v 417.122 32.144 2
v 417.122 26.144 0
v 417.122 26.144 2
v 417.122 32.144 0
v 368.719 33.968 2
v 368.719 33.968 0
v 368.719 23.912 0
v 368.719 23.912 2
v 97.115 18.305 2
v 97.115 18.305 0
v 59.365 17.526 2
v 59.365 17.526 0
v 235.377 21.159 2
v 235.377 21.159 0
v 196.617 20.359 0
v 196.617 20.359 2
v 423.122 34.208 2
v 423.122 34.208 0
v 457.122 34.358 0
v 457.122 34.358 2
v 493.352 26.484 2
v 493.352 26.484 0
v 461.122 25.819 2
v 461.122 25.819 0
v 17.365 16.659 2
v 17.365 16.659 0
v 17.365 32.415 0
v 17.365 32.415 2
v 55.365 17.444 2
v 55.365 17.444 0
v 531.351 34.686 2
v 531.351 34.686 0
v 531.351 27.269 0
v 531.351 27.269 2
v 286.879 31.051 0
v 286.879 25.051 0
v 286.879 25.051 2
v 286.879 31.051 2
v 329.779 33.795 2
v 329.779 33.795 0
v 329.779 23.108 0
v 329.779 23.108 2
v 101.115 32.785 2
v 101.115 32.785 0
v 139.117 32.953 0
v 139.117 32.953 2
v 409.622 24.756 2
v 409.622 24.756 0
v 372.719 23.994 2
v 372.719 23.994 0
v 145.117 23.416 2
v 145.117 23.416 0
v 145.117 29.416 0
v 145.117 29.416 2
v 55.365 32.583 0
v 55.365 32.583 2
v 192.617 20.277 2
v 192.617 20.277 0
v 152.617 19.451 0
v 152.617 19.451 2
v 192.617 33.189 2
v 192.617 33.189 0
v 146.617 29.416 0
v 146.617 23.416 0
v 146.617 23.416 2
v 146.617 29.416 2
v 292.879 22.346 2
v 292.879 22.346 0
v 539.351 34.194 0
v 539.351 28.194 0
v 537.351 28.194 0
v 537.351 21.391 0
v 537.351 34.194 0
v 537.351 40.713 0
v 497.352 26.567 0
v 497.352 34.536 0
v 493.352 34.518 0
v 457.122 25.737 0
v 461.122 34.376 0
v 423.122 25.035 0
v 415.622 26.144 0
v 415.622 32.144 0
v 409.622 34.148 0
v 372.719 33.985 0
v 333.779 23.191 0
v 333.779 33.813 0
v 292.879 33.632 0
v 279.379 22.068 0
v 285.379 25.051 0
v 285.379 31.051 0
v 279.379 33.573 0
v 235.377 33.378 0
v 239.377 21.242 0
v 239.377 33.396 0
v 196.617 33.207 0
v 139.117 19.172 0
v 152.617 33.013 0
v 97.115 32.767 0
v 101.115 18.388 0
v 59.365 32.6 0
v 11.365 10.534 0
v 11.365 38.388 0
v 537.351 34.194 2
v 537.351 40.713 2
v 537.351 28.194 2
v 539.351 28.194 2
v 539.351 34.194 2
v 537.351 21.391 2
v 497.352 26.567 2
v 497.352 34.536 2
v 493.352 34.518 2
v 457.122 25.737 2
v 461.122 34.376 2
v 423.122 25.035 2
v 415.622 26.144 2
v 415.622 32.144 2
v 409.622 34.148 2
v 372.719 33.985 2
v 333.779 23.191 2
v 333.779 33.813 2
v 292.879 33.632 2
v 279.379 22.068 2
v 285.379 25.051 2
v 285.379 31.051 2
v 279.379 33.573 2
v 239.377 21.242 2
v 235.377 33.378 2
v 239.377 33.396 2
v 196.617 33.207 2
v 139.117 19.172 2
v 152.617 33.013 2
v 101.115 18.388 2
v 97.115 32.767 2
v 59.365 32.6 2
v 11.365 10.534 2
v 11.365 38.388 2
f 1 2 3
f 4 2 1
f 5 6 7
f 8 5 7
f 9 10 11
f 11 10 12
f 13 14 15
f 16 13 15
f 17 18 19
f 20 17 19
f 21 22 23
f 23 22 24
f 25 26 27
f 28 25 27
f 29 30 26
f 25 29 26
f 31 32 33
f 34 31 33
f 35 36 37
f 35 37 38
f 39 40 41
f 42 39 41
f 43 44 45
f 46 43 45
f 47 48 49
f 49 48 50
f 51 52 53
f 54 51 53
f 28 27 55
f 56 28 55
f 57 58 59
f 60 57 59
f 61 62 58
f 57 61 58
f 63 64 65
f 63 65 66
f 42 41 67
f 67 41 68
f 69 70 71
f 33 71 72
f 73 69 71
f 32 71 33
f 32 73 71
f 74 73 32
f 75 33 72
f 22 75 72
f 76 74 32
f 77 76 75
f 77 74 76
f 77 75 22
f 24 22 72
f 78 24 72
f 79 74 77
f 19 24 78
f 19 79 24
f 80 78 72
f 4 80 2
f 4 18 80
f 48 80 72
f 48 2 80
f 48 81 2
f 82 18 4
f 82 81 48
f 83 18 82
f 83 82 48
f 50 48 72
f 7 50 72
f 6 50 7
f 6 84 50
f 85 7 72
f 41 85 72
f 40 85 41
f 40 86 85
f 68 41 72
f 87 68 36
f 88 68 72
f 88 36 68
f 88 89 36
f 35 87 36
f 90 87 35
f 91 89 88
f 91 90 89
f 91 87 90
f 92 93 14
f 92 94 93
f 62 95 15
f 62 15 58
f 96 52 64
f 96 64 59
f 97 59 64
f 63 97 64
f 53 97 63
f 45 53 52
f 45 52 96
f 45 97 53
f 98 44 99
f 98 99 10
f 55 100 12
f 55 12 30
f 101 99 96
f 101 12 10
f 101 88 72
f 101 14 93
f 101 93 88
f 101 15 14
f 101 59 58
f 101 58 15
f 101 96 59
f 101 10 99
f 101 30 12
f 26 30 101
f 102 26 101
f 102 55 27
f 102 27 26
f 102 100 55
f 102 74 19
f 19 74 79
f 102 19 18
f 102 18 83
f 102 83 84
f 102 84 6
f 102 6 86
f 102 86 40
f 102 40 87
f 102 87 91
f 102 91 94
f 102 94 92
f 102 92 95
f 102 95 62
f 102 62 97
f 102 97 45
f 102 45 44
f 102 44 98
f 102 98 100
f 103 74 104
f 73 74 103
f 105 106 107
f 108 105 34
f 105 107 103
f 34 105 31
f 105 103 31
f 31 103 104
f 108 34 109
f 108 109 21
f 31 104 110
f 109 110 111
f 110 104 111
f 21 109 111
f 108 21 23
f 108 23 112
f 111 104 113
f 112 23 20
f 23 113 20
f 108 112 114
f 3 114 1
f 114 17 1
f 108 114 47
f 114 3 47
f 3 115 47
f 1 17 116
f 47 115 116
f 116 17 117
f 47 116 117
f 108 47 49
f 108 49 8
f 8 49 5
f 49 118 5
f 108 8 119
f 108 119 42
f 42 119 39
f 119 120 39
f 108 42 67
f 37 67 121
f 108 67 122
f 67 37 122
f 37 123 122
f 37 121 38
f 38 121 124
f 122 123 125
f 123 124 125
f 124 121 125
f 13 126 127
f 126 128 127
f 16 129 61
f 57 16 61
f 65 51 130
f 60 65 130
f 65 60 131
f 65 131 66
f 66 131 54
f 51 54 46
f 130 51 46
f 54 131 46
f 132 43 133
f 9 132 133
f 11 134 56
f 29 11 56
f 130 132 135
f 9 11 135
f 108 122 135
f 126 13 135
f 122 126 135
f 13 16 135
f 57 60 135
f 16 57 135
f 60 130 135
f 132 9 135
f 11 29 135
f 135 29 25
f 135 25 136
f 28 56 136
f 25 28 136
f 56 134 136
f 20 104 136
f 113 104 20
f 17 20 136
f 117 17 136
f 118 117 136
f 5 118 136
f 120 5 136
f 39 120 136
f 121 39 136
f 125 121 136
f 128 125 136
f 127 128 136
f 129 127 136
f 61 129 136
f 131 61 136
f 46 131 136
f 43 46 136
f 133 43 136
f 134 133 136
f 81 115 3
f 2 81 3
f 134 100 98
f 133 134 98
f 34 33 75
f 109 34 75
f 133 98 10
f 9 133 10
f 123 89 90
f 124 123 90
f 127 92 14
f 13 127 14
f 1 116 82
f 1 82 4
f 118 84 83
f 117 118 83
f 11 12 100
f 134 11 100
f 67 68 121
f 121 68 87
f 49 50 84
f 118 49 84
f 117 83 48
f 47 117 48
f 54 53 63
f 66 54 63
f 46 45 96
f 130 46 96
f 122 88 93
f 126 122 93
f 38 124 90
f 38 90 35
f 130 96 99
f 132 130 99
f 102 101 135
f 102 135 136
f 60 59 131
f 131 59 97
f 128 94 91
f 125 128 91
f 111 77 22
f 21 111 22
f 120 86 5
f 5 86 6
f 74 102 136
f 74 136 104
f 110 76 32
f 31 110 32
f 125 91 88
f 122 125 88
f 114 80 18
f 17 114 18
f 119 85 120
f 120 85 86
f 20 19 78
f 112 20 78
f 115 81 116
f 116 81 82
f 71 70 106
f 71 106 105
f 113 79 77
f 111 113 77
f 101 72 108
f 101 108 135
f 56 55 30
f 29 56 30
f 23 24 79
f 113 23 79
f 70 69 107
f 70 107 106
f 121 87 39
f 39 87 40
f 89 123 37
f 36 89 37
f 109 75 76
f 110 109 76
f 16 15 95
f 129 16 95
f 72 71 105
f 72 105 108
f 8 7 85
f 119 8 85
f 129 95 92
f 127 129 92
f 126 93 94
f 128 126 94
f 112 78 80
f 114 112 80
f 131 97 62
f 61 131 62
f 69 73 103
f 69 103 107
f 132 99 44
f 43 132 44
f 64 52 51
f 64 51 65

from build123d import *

# Parameters (mm, degrees)
SKETCH_1_W      = 1.499999968
SKETCH_1_H      = 6.000000011
SKETCH_1_H_2    = 6.00000001
SKETCH_1_W_2    = 1.5
SKETCH_1_H_3    = 6
EXTRUDE_1_DEPTH = 2


with BuildPart() as part:
    # 草图1 → 凸台-拉伸1 (new body)
    with BuildSketch(Plane.XY):
        Polygon((537.351209242, 34.194218327), (539.351209242, 34.194218327), (539.351209242, 28.194218337), (537.351209274, 28.194218337), (537.351209274, 21.391410378), (11.364676515, 10.534074896), (11.364676515, 38.388326082), (537.351216266, 40.712891717), align=None)
        with Locations((416.371863849, 29.143567663)):
            Rectangle(SKETCH_1_W, SKETCH_1_H, mode=Mode.SUBTRACT)
        with Locations((286.128813818, 28.050804453)):
            Rectangle(SKETCH_1_W, SKETCH_1_H_2, mode=Mode.SUBTRACT)
        with Locations((145.867074626, 26.415625273)):
            Rectangle(SKETCH_1_W_2, SKETCH_1_H_3, mode=Mode.SUBTRACT)
        Polygon((531.351209242, 34.686316456), (531.351209242, 27.268837395), (497.351863833, 26.567027983), (497.351863833, 34.536058409), align=None, mode=Mode.SUBTRACT)
        Polygon((493.351863833, 26.48446058), (461.121863833, 25.819173732), (461.121863833, 34.37594212), (493.351863833, 34.518380652), align=None, mode=Mode.SUBTRACT)
        Polygon((457.121863833, 25.736606329), (423.121863833, 25.034783405), (423.121863833, 34.208003423), (457.121863833, 34.358264363), align=None, mode=Mode.SUBTRACT)
        Polygon((409.621863833, 34.148340991), (409.621863833, 24.75611842), (372.718813802, 23.994371171), (372.718813802, 33.985250198), align=None, mode=Mode.SUBTRACT)
        Polygon((368.718813802, 23.911803768), (333.778813802, 23.190577505), (333.778813802, 33.813157228), (368.718813802, 33.967572441), align=None, mode=Mode.SUBTRACT)
        Polygon((329.778813802, 23.108010102), (292.878813802, 22.346325811), (292.878813802, 33.632402157), (329.778813802, 33.79547947), align=None, mode=Mode.SUBTRACT)
        Polygon((279.378813802, 33.572739725), (279.378813802, 22.067660826), (239.377074626, 21.241950898), (239.377074626, 33.395954463), align=None, mode=Mode.SUBTRACT)
        Polygon((235.377074626, 21.159383496), (196.617074626, 20.359305362), (196.617074626, 33.206979234), (235.377074626, 33.378276705), align=None, mode=Mode.SUBTRACT)
        Polygon((192.617074626, 20.276737959), (152.617074626, 19.451063931), (152.617074626, 33.012523901), (192.617074626, 33.189301477), align=None, mode=Mode.SUBTRACT)
        Polygon((139.117074626, 32.952861469), (139.117074626, 19.172398947), (101.114676515, 18.387959118), (101.114676515, 32.784912174), align=None, mode=Mode.SUBTRACT)
        Polygon((97.114676515, 18.305391716), (59.364676515, 17.526161852), (59.364676515, 32.600400579), (97.114676515, 32.767234416), align=None, mode=Mode.SUBTRACT)
        Polygon((55.364676515, 17.443594449), (17.364676515, 16.659204122), (17.364676515, 32.414784125), (55.364676515, 32.582722822), align=None, mode=Mode.SUBTRACT)
    extrude(amount=EXTRUDE_1_DEPTH)


solid = part.part
